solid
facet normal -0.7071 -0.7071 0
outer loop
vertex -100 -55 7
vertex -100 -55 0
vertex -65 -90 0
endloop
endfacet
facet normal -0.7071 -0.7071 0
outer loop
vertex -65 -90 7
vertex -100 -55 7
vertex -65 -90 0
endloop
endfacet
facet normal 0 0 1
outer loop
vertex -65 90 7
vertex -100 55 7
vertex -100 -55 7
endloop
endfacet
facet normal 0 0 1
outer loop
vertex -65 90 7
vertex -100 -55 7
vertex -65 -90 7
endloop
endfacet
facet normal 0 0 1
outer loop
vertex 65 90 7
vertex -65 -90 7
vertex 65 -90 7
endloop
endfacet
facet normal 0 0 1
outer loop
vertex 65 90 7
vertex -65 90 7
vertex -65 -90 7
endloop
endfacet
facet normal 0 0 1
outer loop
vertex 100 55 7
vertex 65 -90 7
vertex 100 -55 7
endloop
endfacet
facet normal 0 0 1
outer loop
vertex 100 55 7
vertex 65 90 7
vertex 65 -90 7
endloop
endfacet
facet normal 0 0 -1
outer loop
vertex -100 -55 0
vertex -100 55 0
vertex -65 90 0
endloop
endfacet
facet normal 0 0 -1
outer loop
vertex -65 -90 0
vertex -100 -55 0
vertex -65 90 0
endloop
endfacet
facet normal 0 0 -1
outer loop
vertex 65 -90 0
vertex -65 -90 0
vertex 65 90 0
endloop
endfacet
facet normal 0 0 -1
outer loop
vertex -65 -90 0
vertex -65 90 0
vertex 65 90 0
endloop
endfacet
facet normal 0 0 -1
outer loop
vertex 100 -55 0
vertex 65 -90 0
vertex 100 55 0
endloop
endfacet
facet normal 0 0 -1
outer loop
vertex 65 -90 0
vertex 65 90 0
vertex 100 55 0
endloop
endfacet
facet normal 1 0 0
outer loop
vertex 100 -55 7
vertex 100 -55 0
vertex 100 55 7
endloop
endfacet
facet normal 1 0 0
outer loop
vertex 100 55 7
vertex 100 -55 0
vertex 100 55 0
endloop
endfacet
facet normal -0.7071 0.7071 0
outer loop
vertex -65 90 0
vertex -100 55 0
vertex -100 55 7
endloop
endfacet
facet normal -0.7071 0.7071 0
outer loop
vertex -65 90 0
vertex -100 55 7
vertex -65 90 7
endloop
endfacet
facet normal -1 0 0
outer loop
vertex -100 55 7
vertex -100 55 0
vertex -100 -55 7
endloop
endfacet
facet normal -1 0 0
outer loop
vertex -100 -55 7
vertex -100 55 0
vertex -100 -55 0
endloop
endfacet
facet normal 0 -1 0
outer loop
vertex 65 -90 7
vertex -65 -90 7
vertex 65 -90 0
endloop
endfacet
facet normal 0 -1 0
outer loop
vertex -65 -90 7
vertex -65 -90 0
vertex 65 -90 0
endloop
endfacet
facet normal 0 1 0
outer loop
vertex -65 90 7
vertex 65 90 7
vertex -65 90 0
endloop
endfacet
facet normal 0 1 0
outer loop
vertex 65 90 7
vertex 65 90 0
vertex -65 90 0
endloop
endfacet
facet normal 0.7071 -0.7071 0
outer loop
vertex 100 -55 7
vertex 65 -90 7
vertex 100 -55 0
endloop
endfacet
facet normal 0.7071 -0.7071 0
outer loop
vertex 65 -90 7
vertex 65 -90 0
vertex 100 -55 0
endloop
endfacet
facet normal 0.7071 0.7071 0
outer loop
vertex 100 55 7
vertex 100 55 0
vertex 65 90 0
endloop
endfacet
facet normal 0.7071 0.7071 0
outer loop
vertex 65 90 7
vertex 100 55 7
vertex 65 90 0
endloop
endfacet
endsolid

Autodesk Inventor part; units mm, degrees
ref_plane "YZ Plane" through (0, 0, 0) normal (1, 0, 0) x (0, 1, 0)
ref_plane "XZ Plane" through (0, 0, 0) normal (0, 1, 0) x (-1, 0, 0)
ref_plane "XY Plane" through (0, 0, 0) normal (0, 0, 1) x (1, 0, 0)
sketch "Эскиз1" plane through (0, 0, 0) normal (0, 0, 1) x (1, 0, 0)
  line L0 (11.0194, 105.4233) -> (11.0194, 99.2429)
  line L1 (11.0194, 99.2429) -> (-11.0194, 99.2429)
  line L2 (-11.0194, 99.2429) -> (-11.0194, 105.4233)
  line L3 (-11.0194, 105.4233) -> (11.0194, 105.4233)
  circle A0 centre (104, 76) radius 1.481
  circle A1 centre (104, -76) radius 1.481
  circle A2 centre (-104, -76) radius 1.481
  circle A3 centre (-104, 76) radius 1.481
  arc A4 (135.5, -107) -> (137.5, -105) centre (135.5, -105) ccw
  line L4 (137.5, 105) -> (137.5, -105)
  arc A5 (137.5, 105) -> (135.5, 107) centre (135.5, 105) ccw
  line L5 (-135.5, 107) -> (135.5, 107)
  arc A6 (-135.5, 107) -> (-137.5, 105) centre (-135.5, 105) ccw
  line L6 (-137.5, -105) -> (-137.5, 105)
  arc A7 (-137.5, -105) -> (-135.5, -107) centre (-135.5, -105) ccw
  line L7 (135.5, -107) -> (-135.5, -107)
  line L8 (-132.5, -102) -> (-132.5, 102)
  line L9 (-132.5, 102) -> (132.5, 102)
  line L10 (132.5, 102) -> (132.5, -102)
  line L11 (132.5, -102) -> (-132.5, -102)
  point P0 (0, 0)
  dimension "d0" = 5
extrude "Выдавливание1" add sketch "Эскиз1" along normal blind 7 contours L9 L10 L11 L8 L2 L1 L0 | L0 L1 L2 L9
sketch "Эскиз2" plane through (0, 0, 7) normal (0, 0, 1) x (1, 0, 0)
  line L0 (-146.9193, 158.9761) -> (149.0915, 158.9761) construction
  line L1 (149.0915, 158.9761) -> (149.0915, -137.0348) construction
  line L2 (149.0915, -137.0348) -> (-146.9193, -137.0348) construction
  line L3 (-146.9193, -137.0348) -> (-146.9193, 158.9761) construction
  point P0 (0, 0)
decal "Маркировка1"
sketch "Эскиз4" plane through (0, 0, 0) normal (0, 0, -1) x (-1, 0, 0)
  line L0 (-100, 90) -> (100, 90)
  line L1 (100, 90) -> (100, -90)
  line L2 (100, -90) -> (-100, -90)
  line L3 (-100, -90) -> (-100, 90)
  line L4 (-100, 90) -> (100, -90) construction
  line L5 (100, 90) -> (-100, -90) construction
  line L6 (100, -55) -> (65, -90)
  line L7 (-65, -90) -> (-100, -55)
  line L8 (-100, 55) -> (-65, 90)
  line L9 (100, 55) -> (65, 90)
  line L10 (-65, 90) -> (65, 90) construction
  line L11 (65, 90) -> (65, -90) construction
  line L12 (65, -90) -> (-65, -90) construction
  line L13 (-65, -90) -> (-65, 90) construction
  line L14 (-65, 90) -> (65, -90) construction
  line L15 (65, 90) -> (-65, -90) construction
  line L16 (-276.1466, 193.443) -> (276.1466, 193.443)
  line L17 (276.1466, 193.443) -> (276.1466, -193.443)
  line L18 (276.1466, -193.443) -> (-276.1466, -193.443)
  line L19 (-276.1466, -193.443) -> (-276.1466, 193.443)
  line L20 (-276.1466, 193.443) -> (276.1466, -193.443) construction
  line L21 (276.1466, 193.443) -> (-276.1466, -193.443) construction
  point P0 (0, 0)
  point P1 (0, 0)
  dimension "d18" = 200
  dimension "d19" = 180
  dimension "d20" = 45
  dimension "d21" = 45
  dimension "d22" = 45
  dimension "d23" = 45
  dimension "d24" = 130
extrude "Выдавливание3" cut sketch "Эскиз4" against normal blind 10 contours L0 L8 L3 | L0 L1 L9 | L7 L2 L3 | L1 L2 L6 | L16 L17 L18 L19
properties part number "утепление стола"
